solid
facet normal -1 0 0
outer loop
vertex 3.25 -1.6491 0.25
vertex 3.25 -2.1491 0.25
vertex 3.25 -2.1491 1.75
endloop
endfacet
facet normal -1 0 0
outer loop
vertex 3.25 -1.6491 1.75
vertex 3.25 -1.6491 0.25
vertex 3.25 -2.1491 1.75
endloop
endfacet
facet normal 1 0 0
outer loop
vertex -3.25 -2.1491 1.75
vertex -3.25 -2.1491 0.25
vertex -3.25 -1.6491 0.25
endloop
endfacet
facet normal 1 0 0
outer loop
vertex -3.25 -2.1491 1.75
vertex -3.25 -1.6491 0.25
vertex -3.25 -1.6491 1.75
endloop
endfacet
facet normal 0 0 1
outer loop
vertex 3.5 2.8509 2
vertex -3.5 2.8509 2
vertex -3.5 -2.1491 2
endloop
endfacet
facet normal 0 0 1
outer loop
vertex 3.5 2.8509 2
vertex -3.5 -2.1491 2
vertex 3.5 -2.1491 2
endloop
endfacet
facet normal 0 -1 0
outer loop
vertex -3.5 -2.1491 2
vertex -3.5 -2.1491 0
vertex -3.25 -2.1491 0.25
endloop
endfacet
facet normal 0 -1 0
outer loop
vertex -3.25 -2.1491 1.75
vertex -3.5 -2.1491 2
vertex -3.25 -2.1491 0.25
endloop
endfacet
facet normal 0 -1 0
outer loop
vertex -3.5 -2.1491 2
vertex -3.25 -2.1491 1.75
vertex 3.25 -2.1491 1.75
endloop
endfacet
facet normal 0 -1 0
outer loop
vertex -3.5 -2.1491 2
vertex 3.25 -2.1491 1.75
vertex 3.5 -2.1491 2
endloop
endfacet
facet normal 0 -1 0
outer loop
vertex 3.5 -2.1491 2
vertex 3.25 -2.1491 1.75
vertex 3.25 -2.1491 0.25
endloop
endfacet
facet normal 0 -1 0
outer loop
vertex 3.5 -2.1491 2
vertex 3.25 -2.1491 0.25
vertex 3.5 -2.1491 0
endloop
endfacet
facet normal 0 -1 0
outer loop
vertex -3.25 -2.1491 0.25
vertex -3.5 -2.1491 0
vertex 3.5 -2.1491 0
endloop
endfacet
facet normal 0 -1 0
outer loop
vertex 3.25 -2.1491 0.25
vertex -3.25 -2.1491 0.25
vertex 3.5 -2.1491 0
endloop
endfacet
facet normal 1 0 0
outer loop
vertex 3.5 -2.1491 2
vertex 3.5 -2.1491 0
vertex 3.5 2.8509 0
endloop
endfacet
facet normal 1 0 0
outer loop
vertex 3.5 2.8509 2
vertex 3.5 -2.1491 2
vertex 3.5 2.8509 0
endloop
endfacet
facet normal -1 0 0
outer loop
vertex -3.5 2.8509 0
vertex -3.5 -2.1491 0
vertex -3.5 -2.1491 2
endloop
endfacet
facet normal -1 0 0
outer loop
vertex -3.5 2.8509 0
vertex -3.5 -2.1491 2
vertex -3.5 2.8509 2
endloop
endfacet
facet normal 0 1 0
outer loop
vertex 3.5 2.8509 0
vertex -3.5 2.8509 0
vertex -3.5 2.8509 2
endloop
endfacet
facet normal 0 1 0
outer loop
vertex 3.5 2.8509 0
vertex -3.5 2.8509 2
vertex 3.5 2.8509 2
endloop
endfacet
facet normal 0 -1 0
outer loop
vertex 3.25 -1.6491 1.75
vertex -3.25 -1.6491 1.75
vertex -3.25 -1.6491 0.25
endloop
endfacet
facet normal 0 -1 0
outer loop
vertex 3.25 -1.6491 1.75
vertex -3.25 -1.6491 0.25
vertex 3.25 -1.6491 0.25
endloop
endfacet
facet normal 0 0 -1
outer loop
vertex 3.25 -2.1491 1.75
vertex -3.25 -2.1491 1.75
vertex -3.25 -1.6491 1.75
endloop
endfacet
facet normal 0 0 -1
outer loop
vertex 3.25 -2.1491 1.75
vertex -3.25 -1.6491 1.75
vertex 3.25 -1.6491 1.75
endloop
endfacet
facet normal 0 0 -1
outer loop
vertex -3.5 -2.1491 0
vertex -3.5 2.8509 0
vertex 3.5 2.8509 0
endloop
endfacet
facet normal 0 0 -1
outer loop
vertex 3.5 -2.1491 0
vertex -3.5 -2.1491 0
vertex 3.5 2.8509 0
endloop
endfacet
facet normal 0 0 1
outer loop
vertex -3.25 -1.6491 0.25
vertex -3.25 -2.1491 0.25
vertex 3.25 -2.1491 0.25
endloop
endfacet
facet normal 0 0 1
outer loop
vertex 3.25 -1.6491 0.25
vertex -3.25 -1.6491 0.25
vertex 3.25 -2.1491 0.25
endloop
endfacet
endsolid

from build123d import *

# Parameters (mm, degrees)
SKETCH2_W           = 7
SKETCH2_H           = 5
BOSS_EXTRUDE1_DEPTH = 2
SKETCH3_W           = 6.5
SKETCH3_H           = 1.5
CUT_EXTRUDE1_DEPTH  = 0.5


with BuildPart() as part:
    # Sketch2 → Boss-Extrude1 (new body)
    with BuildSketch(Plane.XY):
        with Locations((0, 0.3508563)):
            Rectangle(SKETCH2_W, SKETCH2_H)
    extrude(amount=BOSS_EXTRUDE1_DEPTH)

    # Sketch3 → Cut-Extrude1 (cut)
    with BuildSketch(Plane.XZ.offset(2.1491437)):
        with Locations((0, 1)):
            Rectangle(SKETCH3_W, SKETCH3_H)
    extrude(amount=-CUT_EXTRUDE1_DEPTH, mode=Mode.SUBTRACT)


solid = part.part
